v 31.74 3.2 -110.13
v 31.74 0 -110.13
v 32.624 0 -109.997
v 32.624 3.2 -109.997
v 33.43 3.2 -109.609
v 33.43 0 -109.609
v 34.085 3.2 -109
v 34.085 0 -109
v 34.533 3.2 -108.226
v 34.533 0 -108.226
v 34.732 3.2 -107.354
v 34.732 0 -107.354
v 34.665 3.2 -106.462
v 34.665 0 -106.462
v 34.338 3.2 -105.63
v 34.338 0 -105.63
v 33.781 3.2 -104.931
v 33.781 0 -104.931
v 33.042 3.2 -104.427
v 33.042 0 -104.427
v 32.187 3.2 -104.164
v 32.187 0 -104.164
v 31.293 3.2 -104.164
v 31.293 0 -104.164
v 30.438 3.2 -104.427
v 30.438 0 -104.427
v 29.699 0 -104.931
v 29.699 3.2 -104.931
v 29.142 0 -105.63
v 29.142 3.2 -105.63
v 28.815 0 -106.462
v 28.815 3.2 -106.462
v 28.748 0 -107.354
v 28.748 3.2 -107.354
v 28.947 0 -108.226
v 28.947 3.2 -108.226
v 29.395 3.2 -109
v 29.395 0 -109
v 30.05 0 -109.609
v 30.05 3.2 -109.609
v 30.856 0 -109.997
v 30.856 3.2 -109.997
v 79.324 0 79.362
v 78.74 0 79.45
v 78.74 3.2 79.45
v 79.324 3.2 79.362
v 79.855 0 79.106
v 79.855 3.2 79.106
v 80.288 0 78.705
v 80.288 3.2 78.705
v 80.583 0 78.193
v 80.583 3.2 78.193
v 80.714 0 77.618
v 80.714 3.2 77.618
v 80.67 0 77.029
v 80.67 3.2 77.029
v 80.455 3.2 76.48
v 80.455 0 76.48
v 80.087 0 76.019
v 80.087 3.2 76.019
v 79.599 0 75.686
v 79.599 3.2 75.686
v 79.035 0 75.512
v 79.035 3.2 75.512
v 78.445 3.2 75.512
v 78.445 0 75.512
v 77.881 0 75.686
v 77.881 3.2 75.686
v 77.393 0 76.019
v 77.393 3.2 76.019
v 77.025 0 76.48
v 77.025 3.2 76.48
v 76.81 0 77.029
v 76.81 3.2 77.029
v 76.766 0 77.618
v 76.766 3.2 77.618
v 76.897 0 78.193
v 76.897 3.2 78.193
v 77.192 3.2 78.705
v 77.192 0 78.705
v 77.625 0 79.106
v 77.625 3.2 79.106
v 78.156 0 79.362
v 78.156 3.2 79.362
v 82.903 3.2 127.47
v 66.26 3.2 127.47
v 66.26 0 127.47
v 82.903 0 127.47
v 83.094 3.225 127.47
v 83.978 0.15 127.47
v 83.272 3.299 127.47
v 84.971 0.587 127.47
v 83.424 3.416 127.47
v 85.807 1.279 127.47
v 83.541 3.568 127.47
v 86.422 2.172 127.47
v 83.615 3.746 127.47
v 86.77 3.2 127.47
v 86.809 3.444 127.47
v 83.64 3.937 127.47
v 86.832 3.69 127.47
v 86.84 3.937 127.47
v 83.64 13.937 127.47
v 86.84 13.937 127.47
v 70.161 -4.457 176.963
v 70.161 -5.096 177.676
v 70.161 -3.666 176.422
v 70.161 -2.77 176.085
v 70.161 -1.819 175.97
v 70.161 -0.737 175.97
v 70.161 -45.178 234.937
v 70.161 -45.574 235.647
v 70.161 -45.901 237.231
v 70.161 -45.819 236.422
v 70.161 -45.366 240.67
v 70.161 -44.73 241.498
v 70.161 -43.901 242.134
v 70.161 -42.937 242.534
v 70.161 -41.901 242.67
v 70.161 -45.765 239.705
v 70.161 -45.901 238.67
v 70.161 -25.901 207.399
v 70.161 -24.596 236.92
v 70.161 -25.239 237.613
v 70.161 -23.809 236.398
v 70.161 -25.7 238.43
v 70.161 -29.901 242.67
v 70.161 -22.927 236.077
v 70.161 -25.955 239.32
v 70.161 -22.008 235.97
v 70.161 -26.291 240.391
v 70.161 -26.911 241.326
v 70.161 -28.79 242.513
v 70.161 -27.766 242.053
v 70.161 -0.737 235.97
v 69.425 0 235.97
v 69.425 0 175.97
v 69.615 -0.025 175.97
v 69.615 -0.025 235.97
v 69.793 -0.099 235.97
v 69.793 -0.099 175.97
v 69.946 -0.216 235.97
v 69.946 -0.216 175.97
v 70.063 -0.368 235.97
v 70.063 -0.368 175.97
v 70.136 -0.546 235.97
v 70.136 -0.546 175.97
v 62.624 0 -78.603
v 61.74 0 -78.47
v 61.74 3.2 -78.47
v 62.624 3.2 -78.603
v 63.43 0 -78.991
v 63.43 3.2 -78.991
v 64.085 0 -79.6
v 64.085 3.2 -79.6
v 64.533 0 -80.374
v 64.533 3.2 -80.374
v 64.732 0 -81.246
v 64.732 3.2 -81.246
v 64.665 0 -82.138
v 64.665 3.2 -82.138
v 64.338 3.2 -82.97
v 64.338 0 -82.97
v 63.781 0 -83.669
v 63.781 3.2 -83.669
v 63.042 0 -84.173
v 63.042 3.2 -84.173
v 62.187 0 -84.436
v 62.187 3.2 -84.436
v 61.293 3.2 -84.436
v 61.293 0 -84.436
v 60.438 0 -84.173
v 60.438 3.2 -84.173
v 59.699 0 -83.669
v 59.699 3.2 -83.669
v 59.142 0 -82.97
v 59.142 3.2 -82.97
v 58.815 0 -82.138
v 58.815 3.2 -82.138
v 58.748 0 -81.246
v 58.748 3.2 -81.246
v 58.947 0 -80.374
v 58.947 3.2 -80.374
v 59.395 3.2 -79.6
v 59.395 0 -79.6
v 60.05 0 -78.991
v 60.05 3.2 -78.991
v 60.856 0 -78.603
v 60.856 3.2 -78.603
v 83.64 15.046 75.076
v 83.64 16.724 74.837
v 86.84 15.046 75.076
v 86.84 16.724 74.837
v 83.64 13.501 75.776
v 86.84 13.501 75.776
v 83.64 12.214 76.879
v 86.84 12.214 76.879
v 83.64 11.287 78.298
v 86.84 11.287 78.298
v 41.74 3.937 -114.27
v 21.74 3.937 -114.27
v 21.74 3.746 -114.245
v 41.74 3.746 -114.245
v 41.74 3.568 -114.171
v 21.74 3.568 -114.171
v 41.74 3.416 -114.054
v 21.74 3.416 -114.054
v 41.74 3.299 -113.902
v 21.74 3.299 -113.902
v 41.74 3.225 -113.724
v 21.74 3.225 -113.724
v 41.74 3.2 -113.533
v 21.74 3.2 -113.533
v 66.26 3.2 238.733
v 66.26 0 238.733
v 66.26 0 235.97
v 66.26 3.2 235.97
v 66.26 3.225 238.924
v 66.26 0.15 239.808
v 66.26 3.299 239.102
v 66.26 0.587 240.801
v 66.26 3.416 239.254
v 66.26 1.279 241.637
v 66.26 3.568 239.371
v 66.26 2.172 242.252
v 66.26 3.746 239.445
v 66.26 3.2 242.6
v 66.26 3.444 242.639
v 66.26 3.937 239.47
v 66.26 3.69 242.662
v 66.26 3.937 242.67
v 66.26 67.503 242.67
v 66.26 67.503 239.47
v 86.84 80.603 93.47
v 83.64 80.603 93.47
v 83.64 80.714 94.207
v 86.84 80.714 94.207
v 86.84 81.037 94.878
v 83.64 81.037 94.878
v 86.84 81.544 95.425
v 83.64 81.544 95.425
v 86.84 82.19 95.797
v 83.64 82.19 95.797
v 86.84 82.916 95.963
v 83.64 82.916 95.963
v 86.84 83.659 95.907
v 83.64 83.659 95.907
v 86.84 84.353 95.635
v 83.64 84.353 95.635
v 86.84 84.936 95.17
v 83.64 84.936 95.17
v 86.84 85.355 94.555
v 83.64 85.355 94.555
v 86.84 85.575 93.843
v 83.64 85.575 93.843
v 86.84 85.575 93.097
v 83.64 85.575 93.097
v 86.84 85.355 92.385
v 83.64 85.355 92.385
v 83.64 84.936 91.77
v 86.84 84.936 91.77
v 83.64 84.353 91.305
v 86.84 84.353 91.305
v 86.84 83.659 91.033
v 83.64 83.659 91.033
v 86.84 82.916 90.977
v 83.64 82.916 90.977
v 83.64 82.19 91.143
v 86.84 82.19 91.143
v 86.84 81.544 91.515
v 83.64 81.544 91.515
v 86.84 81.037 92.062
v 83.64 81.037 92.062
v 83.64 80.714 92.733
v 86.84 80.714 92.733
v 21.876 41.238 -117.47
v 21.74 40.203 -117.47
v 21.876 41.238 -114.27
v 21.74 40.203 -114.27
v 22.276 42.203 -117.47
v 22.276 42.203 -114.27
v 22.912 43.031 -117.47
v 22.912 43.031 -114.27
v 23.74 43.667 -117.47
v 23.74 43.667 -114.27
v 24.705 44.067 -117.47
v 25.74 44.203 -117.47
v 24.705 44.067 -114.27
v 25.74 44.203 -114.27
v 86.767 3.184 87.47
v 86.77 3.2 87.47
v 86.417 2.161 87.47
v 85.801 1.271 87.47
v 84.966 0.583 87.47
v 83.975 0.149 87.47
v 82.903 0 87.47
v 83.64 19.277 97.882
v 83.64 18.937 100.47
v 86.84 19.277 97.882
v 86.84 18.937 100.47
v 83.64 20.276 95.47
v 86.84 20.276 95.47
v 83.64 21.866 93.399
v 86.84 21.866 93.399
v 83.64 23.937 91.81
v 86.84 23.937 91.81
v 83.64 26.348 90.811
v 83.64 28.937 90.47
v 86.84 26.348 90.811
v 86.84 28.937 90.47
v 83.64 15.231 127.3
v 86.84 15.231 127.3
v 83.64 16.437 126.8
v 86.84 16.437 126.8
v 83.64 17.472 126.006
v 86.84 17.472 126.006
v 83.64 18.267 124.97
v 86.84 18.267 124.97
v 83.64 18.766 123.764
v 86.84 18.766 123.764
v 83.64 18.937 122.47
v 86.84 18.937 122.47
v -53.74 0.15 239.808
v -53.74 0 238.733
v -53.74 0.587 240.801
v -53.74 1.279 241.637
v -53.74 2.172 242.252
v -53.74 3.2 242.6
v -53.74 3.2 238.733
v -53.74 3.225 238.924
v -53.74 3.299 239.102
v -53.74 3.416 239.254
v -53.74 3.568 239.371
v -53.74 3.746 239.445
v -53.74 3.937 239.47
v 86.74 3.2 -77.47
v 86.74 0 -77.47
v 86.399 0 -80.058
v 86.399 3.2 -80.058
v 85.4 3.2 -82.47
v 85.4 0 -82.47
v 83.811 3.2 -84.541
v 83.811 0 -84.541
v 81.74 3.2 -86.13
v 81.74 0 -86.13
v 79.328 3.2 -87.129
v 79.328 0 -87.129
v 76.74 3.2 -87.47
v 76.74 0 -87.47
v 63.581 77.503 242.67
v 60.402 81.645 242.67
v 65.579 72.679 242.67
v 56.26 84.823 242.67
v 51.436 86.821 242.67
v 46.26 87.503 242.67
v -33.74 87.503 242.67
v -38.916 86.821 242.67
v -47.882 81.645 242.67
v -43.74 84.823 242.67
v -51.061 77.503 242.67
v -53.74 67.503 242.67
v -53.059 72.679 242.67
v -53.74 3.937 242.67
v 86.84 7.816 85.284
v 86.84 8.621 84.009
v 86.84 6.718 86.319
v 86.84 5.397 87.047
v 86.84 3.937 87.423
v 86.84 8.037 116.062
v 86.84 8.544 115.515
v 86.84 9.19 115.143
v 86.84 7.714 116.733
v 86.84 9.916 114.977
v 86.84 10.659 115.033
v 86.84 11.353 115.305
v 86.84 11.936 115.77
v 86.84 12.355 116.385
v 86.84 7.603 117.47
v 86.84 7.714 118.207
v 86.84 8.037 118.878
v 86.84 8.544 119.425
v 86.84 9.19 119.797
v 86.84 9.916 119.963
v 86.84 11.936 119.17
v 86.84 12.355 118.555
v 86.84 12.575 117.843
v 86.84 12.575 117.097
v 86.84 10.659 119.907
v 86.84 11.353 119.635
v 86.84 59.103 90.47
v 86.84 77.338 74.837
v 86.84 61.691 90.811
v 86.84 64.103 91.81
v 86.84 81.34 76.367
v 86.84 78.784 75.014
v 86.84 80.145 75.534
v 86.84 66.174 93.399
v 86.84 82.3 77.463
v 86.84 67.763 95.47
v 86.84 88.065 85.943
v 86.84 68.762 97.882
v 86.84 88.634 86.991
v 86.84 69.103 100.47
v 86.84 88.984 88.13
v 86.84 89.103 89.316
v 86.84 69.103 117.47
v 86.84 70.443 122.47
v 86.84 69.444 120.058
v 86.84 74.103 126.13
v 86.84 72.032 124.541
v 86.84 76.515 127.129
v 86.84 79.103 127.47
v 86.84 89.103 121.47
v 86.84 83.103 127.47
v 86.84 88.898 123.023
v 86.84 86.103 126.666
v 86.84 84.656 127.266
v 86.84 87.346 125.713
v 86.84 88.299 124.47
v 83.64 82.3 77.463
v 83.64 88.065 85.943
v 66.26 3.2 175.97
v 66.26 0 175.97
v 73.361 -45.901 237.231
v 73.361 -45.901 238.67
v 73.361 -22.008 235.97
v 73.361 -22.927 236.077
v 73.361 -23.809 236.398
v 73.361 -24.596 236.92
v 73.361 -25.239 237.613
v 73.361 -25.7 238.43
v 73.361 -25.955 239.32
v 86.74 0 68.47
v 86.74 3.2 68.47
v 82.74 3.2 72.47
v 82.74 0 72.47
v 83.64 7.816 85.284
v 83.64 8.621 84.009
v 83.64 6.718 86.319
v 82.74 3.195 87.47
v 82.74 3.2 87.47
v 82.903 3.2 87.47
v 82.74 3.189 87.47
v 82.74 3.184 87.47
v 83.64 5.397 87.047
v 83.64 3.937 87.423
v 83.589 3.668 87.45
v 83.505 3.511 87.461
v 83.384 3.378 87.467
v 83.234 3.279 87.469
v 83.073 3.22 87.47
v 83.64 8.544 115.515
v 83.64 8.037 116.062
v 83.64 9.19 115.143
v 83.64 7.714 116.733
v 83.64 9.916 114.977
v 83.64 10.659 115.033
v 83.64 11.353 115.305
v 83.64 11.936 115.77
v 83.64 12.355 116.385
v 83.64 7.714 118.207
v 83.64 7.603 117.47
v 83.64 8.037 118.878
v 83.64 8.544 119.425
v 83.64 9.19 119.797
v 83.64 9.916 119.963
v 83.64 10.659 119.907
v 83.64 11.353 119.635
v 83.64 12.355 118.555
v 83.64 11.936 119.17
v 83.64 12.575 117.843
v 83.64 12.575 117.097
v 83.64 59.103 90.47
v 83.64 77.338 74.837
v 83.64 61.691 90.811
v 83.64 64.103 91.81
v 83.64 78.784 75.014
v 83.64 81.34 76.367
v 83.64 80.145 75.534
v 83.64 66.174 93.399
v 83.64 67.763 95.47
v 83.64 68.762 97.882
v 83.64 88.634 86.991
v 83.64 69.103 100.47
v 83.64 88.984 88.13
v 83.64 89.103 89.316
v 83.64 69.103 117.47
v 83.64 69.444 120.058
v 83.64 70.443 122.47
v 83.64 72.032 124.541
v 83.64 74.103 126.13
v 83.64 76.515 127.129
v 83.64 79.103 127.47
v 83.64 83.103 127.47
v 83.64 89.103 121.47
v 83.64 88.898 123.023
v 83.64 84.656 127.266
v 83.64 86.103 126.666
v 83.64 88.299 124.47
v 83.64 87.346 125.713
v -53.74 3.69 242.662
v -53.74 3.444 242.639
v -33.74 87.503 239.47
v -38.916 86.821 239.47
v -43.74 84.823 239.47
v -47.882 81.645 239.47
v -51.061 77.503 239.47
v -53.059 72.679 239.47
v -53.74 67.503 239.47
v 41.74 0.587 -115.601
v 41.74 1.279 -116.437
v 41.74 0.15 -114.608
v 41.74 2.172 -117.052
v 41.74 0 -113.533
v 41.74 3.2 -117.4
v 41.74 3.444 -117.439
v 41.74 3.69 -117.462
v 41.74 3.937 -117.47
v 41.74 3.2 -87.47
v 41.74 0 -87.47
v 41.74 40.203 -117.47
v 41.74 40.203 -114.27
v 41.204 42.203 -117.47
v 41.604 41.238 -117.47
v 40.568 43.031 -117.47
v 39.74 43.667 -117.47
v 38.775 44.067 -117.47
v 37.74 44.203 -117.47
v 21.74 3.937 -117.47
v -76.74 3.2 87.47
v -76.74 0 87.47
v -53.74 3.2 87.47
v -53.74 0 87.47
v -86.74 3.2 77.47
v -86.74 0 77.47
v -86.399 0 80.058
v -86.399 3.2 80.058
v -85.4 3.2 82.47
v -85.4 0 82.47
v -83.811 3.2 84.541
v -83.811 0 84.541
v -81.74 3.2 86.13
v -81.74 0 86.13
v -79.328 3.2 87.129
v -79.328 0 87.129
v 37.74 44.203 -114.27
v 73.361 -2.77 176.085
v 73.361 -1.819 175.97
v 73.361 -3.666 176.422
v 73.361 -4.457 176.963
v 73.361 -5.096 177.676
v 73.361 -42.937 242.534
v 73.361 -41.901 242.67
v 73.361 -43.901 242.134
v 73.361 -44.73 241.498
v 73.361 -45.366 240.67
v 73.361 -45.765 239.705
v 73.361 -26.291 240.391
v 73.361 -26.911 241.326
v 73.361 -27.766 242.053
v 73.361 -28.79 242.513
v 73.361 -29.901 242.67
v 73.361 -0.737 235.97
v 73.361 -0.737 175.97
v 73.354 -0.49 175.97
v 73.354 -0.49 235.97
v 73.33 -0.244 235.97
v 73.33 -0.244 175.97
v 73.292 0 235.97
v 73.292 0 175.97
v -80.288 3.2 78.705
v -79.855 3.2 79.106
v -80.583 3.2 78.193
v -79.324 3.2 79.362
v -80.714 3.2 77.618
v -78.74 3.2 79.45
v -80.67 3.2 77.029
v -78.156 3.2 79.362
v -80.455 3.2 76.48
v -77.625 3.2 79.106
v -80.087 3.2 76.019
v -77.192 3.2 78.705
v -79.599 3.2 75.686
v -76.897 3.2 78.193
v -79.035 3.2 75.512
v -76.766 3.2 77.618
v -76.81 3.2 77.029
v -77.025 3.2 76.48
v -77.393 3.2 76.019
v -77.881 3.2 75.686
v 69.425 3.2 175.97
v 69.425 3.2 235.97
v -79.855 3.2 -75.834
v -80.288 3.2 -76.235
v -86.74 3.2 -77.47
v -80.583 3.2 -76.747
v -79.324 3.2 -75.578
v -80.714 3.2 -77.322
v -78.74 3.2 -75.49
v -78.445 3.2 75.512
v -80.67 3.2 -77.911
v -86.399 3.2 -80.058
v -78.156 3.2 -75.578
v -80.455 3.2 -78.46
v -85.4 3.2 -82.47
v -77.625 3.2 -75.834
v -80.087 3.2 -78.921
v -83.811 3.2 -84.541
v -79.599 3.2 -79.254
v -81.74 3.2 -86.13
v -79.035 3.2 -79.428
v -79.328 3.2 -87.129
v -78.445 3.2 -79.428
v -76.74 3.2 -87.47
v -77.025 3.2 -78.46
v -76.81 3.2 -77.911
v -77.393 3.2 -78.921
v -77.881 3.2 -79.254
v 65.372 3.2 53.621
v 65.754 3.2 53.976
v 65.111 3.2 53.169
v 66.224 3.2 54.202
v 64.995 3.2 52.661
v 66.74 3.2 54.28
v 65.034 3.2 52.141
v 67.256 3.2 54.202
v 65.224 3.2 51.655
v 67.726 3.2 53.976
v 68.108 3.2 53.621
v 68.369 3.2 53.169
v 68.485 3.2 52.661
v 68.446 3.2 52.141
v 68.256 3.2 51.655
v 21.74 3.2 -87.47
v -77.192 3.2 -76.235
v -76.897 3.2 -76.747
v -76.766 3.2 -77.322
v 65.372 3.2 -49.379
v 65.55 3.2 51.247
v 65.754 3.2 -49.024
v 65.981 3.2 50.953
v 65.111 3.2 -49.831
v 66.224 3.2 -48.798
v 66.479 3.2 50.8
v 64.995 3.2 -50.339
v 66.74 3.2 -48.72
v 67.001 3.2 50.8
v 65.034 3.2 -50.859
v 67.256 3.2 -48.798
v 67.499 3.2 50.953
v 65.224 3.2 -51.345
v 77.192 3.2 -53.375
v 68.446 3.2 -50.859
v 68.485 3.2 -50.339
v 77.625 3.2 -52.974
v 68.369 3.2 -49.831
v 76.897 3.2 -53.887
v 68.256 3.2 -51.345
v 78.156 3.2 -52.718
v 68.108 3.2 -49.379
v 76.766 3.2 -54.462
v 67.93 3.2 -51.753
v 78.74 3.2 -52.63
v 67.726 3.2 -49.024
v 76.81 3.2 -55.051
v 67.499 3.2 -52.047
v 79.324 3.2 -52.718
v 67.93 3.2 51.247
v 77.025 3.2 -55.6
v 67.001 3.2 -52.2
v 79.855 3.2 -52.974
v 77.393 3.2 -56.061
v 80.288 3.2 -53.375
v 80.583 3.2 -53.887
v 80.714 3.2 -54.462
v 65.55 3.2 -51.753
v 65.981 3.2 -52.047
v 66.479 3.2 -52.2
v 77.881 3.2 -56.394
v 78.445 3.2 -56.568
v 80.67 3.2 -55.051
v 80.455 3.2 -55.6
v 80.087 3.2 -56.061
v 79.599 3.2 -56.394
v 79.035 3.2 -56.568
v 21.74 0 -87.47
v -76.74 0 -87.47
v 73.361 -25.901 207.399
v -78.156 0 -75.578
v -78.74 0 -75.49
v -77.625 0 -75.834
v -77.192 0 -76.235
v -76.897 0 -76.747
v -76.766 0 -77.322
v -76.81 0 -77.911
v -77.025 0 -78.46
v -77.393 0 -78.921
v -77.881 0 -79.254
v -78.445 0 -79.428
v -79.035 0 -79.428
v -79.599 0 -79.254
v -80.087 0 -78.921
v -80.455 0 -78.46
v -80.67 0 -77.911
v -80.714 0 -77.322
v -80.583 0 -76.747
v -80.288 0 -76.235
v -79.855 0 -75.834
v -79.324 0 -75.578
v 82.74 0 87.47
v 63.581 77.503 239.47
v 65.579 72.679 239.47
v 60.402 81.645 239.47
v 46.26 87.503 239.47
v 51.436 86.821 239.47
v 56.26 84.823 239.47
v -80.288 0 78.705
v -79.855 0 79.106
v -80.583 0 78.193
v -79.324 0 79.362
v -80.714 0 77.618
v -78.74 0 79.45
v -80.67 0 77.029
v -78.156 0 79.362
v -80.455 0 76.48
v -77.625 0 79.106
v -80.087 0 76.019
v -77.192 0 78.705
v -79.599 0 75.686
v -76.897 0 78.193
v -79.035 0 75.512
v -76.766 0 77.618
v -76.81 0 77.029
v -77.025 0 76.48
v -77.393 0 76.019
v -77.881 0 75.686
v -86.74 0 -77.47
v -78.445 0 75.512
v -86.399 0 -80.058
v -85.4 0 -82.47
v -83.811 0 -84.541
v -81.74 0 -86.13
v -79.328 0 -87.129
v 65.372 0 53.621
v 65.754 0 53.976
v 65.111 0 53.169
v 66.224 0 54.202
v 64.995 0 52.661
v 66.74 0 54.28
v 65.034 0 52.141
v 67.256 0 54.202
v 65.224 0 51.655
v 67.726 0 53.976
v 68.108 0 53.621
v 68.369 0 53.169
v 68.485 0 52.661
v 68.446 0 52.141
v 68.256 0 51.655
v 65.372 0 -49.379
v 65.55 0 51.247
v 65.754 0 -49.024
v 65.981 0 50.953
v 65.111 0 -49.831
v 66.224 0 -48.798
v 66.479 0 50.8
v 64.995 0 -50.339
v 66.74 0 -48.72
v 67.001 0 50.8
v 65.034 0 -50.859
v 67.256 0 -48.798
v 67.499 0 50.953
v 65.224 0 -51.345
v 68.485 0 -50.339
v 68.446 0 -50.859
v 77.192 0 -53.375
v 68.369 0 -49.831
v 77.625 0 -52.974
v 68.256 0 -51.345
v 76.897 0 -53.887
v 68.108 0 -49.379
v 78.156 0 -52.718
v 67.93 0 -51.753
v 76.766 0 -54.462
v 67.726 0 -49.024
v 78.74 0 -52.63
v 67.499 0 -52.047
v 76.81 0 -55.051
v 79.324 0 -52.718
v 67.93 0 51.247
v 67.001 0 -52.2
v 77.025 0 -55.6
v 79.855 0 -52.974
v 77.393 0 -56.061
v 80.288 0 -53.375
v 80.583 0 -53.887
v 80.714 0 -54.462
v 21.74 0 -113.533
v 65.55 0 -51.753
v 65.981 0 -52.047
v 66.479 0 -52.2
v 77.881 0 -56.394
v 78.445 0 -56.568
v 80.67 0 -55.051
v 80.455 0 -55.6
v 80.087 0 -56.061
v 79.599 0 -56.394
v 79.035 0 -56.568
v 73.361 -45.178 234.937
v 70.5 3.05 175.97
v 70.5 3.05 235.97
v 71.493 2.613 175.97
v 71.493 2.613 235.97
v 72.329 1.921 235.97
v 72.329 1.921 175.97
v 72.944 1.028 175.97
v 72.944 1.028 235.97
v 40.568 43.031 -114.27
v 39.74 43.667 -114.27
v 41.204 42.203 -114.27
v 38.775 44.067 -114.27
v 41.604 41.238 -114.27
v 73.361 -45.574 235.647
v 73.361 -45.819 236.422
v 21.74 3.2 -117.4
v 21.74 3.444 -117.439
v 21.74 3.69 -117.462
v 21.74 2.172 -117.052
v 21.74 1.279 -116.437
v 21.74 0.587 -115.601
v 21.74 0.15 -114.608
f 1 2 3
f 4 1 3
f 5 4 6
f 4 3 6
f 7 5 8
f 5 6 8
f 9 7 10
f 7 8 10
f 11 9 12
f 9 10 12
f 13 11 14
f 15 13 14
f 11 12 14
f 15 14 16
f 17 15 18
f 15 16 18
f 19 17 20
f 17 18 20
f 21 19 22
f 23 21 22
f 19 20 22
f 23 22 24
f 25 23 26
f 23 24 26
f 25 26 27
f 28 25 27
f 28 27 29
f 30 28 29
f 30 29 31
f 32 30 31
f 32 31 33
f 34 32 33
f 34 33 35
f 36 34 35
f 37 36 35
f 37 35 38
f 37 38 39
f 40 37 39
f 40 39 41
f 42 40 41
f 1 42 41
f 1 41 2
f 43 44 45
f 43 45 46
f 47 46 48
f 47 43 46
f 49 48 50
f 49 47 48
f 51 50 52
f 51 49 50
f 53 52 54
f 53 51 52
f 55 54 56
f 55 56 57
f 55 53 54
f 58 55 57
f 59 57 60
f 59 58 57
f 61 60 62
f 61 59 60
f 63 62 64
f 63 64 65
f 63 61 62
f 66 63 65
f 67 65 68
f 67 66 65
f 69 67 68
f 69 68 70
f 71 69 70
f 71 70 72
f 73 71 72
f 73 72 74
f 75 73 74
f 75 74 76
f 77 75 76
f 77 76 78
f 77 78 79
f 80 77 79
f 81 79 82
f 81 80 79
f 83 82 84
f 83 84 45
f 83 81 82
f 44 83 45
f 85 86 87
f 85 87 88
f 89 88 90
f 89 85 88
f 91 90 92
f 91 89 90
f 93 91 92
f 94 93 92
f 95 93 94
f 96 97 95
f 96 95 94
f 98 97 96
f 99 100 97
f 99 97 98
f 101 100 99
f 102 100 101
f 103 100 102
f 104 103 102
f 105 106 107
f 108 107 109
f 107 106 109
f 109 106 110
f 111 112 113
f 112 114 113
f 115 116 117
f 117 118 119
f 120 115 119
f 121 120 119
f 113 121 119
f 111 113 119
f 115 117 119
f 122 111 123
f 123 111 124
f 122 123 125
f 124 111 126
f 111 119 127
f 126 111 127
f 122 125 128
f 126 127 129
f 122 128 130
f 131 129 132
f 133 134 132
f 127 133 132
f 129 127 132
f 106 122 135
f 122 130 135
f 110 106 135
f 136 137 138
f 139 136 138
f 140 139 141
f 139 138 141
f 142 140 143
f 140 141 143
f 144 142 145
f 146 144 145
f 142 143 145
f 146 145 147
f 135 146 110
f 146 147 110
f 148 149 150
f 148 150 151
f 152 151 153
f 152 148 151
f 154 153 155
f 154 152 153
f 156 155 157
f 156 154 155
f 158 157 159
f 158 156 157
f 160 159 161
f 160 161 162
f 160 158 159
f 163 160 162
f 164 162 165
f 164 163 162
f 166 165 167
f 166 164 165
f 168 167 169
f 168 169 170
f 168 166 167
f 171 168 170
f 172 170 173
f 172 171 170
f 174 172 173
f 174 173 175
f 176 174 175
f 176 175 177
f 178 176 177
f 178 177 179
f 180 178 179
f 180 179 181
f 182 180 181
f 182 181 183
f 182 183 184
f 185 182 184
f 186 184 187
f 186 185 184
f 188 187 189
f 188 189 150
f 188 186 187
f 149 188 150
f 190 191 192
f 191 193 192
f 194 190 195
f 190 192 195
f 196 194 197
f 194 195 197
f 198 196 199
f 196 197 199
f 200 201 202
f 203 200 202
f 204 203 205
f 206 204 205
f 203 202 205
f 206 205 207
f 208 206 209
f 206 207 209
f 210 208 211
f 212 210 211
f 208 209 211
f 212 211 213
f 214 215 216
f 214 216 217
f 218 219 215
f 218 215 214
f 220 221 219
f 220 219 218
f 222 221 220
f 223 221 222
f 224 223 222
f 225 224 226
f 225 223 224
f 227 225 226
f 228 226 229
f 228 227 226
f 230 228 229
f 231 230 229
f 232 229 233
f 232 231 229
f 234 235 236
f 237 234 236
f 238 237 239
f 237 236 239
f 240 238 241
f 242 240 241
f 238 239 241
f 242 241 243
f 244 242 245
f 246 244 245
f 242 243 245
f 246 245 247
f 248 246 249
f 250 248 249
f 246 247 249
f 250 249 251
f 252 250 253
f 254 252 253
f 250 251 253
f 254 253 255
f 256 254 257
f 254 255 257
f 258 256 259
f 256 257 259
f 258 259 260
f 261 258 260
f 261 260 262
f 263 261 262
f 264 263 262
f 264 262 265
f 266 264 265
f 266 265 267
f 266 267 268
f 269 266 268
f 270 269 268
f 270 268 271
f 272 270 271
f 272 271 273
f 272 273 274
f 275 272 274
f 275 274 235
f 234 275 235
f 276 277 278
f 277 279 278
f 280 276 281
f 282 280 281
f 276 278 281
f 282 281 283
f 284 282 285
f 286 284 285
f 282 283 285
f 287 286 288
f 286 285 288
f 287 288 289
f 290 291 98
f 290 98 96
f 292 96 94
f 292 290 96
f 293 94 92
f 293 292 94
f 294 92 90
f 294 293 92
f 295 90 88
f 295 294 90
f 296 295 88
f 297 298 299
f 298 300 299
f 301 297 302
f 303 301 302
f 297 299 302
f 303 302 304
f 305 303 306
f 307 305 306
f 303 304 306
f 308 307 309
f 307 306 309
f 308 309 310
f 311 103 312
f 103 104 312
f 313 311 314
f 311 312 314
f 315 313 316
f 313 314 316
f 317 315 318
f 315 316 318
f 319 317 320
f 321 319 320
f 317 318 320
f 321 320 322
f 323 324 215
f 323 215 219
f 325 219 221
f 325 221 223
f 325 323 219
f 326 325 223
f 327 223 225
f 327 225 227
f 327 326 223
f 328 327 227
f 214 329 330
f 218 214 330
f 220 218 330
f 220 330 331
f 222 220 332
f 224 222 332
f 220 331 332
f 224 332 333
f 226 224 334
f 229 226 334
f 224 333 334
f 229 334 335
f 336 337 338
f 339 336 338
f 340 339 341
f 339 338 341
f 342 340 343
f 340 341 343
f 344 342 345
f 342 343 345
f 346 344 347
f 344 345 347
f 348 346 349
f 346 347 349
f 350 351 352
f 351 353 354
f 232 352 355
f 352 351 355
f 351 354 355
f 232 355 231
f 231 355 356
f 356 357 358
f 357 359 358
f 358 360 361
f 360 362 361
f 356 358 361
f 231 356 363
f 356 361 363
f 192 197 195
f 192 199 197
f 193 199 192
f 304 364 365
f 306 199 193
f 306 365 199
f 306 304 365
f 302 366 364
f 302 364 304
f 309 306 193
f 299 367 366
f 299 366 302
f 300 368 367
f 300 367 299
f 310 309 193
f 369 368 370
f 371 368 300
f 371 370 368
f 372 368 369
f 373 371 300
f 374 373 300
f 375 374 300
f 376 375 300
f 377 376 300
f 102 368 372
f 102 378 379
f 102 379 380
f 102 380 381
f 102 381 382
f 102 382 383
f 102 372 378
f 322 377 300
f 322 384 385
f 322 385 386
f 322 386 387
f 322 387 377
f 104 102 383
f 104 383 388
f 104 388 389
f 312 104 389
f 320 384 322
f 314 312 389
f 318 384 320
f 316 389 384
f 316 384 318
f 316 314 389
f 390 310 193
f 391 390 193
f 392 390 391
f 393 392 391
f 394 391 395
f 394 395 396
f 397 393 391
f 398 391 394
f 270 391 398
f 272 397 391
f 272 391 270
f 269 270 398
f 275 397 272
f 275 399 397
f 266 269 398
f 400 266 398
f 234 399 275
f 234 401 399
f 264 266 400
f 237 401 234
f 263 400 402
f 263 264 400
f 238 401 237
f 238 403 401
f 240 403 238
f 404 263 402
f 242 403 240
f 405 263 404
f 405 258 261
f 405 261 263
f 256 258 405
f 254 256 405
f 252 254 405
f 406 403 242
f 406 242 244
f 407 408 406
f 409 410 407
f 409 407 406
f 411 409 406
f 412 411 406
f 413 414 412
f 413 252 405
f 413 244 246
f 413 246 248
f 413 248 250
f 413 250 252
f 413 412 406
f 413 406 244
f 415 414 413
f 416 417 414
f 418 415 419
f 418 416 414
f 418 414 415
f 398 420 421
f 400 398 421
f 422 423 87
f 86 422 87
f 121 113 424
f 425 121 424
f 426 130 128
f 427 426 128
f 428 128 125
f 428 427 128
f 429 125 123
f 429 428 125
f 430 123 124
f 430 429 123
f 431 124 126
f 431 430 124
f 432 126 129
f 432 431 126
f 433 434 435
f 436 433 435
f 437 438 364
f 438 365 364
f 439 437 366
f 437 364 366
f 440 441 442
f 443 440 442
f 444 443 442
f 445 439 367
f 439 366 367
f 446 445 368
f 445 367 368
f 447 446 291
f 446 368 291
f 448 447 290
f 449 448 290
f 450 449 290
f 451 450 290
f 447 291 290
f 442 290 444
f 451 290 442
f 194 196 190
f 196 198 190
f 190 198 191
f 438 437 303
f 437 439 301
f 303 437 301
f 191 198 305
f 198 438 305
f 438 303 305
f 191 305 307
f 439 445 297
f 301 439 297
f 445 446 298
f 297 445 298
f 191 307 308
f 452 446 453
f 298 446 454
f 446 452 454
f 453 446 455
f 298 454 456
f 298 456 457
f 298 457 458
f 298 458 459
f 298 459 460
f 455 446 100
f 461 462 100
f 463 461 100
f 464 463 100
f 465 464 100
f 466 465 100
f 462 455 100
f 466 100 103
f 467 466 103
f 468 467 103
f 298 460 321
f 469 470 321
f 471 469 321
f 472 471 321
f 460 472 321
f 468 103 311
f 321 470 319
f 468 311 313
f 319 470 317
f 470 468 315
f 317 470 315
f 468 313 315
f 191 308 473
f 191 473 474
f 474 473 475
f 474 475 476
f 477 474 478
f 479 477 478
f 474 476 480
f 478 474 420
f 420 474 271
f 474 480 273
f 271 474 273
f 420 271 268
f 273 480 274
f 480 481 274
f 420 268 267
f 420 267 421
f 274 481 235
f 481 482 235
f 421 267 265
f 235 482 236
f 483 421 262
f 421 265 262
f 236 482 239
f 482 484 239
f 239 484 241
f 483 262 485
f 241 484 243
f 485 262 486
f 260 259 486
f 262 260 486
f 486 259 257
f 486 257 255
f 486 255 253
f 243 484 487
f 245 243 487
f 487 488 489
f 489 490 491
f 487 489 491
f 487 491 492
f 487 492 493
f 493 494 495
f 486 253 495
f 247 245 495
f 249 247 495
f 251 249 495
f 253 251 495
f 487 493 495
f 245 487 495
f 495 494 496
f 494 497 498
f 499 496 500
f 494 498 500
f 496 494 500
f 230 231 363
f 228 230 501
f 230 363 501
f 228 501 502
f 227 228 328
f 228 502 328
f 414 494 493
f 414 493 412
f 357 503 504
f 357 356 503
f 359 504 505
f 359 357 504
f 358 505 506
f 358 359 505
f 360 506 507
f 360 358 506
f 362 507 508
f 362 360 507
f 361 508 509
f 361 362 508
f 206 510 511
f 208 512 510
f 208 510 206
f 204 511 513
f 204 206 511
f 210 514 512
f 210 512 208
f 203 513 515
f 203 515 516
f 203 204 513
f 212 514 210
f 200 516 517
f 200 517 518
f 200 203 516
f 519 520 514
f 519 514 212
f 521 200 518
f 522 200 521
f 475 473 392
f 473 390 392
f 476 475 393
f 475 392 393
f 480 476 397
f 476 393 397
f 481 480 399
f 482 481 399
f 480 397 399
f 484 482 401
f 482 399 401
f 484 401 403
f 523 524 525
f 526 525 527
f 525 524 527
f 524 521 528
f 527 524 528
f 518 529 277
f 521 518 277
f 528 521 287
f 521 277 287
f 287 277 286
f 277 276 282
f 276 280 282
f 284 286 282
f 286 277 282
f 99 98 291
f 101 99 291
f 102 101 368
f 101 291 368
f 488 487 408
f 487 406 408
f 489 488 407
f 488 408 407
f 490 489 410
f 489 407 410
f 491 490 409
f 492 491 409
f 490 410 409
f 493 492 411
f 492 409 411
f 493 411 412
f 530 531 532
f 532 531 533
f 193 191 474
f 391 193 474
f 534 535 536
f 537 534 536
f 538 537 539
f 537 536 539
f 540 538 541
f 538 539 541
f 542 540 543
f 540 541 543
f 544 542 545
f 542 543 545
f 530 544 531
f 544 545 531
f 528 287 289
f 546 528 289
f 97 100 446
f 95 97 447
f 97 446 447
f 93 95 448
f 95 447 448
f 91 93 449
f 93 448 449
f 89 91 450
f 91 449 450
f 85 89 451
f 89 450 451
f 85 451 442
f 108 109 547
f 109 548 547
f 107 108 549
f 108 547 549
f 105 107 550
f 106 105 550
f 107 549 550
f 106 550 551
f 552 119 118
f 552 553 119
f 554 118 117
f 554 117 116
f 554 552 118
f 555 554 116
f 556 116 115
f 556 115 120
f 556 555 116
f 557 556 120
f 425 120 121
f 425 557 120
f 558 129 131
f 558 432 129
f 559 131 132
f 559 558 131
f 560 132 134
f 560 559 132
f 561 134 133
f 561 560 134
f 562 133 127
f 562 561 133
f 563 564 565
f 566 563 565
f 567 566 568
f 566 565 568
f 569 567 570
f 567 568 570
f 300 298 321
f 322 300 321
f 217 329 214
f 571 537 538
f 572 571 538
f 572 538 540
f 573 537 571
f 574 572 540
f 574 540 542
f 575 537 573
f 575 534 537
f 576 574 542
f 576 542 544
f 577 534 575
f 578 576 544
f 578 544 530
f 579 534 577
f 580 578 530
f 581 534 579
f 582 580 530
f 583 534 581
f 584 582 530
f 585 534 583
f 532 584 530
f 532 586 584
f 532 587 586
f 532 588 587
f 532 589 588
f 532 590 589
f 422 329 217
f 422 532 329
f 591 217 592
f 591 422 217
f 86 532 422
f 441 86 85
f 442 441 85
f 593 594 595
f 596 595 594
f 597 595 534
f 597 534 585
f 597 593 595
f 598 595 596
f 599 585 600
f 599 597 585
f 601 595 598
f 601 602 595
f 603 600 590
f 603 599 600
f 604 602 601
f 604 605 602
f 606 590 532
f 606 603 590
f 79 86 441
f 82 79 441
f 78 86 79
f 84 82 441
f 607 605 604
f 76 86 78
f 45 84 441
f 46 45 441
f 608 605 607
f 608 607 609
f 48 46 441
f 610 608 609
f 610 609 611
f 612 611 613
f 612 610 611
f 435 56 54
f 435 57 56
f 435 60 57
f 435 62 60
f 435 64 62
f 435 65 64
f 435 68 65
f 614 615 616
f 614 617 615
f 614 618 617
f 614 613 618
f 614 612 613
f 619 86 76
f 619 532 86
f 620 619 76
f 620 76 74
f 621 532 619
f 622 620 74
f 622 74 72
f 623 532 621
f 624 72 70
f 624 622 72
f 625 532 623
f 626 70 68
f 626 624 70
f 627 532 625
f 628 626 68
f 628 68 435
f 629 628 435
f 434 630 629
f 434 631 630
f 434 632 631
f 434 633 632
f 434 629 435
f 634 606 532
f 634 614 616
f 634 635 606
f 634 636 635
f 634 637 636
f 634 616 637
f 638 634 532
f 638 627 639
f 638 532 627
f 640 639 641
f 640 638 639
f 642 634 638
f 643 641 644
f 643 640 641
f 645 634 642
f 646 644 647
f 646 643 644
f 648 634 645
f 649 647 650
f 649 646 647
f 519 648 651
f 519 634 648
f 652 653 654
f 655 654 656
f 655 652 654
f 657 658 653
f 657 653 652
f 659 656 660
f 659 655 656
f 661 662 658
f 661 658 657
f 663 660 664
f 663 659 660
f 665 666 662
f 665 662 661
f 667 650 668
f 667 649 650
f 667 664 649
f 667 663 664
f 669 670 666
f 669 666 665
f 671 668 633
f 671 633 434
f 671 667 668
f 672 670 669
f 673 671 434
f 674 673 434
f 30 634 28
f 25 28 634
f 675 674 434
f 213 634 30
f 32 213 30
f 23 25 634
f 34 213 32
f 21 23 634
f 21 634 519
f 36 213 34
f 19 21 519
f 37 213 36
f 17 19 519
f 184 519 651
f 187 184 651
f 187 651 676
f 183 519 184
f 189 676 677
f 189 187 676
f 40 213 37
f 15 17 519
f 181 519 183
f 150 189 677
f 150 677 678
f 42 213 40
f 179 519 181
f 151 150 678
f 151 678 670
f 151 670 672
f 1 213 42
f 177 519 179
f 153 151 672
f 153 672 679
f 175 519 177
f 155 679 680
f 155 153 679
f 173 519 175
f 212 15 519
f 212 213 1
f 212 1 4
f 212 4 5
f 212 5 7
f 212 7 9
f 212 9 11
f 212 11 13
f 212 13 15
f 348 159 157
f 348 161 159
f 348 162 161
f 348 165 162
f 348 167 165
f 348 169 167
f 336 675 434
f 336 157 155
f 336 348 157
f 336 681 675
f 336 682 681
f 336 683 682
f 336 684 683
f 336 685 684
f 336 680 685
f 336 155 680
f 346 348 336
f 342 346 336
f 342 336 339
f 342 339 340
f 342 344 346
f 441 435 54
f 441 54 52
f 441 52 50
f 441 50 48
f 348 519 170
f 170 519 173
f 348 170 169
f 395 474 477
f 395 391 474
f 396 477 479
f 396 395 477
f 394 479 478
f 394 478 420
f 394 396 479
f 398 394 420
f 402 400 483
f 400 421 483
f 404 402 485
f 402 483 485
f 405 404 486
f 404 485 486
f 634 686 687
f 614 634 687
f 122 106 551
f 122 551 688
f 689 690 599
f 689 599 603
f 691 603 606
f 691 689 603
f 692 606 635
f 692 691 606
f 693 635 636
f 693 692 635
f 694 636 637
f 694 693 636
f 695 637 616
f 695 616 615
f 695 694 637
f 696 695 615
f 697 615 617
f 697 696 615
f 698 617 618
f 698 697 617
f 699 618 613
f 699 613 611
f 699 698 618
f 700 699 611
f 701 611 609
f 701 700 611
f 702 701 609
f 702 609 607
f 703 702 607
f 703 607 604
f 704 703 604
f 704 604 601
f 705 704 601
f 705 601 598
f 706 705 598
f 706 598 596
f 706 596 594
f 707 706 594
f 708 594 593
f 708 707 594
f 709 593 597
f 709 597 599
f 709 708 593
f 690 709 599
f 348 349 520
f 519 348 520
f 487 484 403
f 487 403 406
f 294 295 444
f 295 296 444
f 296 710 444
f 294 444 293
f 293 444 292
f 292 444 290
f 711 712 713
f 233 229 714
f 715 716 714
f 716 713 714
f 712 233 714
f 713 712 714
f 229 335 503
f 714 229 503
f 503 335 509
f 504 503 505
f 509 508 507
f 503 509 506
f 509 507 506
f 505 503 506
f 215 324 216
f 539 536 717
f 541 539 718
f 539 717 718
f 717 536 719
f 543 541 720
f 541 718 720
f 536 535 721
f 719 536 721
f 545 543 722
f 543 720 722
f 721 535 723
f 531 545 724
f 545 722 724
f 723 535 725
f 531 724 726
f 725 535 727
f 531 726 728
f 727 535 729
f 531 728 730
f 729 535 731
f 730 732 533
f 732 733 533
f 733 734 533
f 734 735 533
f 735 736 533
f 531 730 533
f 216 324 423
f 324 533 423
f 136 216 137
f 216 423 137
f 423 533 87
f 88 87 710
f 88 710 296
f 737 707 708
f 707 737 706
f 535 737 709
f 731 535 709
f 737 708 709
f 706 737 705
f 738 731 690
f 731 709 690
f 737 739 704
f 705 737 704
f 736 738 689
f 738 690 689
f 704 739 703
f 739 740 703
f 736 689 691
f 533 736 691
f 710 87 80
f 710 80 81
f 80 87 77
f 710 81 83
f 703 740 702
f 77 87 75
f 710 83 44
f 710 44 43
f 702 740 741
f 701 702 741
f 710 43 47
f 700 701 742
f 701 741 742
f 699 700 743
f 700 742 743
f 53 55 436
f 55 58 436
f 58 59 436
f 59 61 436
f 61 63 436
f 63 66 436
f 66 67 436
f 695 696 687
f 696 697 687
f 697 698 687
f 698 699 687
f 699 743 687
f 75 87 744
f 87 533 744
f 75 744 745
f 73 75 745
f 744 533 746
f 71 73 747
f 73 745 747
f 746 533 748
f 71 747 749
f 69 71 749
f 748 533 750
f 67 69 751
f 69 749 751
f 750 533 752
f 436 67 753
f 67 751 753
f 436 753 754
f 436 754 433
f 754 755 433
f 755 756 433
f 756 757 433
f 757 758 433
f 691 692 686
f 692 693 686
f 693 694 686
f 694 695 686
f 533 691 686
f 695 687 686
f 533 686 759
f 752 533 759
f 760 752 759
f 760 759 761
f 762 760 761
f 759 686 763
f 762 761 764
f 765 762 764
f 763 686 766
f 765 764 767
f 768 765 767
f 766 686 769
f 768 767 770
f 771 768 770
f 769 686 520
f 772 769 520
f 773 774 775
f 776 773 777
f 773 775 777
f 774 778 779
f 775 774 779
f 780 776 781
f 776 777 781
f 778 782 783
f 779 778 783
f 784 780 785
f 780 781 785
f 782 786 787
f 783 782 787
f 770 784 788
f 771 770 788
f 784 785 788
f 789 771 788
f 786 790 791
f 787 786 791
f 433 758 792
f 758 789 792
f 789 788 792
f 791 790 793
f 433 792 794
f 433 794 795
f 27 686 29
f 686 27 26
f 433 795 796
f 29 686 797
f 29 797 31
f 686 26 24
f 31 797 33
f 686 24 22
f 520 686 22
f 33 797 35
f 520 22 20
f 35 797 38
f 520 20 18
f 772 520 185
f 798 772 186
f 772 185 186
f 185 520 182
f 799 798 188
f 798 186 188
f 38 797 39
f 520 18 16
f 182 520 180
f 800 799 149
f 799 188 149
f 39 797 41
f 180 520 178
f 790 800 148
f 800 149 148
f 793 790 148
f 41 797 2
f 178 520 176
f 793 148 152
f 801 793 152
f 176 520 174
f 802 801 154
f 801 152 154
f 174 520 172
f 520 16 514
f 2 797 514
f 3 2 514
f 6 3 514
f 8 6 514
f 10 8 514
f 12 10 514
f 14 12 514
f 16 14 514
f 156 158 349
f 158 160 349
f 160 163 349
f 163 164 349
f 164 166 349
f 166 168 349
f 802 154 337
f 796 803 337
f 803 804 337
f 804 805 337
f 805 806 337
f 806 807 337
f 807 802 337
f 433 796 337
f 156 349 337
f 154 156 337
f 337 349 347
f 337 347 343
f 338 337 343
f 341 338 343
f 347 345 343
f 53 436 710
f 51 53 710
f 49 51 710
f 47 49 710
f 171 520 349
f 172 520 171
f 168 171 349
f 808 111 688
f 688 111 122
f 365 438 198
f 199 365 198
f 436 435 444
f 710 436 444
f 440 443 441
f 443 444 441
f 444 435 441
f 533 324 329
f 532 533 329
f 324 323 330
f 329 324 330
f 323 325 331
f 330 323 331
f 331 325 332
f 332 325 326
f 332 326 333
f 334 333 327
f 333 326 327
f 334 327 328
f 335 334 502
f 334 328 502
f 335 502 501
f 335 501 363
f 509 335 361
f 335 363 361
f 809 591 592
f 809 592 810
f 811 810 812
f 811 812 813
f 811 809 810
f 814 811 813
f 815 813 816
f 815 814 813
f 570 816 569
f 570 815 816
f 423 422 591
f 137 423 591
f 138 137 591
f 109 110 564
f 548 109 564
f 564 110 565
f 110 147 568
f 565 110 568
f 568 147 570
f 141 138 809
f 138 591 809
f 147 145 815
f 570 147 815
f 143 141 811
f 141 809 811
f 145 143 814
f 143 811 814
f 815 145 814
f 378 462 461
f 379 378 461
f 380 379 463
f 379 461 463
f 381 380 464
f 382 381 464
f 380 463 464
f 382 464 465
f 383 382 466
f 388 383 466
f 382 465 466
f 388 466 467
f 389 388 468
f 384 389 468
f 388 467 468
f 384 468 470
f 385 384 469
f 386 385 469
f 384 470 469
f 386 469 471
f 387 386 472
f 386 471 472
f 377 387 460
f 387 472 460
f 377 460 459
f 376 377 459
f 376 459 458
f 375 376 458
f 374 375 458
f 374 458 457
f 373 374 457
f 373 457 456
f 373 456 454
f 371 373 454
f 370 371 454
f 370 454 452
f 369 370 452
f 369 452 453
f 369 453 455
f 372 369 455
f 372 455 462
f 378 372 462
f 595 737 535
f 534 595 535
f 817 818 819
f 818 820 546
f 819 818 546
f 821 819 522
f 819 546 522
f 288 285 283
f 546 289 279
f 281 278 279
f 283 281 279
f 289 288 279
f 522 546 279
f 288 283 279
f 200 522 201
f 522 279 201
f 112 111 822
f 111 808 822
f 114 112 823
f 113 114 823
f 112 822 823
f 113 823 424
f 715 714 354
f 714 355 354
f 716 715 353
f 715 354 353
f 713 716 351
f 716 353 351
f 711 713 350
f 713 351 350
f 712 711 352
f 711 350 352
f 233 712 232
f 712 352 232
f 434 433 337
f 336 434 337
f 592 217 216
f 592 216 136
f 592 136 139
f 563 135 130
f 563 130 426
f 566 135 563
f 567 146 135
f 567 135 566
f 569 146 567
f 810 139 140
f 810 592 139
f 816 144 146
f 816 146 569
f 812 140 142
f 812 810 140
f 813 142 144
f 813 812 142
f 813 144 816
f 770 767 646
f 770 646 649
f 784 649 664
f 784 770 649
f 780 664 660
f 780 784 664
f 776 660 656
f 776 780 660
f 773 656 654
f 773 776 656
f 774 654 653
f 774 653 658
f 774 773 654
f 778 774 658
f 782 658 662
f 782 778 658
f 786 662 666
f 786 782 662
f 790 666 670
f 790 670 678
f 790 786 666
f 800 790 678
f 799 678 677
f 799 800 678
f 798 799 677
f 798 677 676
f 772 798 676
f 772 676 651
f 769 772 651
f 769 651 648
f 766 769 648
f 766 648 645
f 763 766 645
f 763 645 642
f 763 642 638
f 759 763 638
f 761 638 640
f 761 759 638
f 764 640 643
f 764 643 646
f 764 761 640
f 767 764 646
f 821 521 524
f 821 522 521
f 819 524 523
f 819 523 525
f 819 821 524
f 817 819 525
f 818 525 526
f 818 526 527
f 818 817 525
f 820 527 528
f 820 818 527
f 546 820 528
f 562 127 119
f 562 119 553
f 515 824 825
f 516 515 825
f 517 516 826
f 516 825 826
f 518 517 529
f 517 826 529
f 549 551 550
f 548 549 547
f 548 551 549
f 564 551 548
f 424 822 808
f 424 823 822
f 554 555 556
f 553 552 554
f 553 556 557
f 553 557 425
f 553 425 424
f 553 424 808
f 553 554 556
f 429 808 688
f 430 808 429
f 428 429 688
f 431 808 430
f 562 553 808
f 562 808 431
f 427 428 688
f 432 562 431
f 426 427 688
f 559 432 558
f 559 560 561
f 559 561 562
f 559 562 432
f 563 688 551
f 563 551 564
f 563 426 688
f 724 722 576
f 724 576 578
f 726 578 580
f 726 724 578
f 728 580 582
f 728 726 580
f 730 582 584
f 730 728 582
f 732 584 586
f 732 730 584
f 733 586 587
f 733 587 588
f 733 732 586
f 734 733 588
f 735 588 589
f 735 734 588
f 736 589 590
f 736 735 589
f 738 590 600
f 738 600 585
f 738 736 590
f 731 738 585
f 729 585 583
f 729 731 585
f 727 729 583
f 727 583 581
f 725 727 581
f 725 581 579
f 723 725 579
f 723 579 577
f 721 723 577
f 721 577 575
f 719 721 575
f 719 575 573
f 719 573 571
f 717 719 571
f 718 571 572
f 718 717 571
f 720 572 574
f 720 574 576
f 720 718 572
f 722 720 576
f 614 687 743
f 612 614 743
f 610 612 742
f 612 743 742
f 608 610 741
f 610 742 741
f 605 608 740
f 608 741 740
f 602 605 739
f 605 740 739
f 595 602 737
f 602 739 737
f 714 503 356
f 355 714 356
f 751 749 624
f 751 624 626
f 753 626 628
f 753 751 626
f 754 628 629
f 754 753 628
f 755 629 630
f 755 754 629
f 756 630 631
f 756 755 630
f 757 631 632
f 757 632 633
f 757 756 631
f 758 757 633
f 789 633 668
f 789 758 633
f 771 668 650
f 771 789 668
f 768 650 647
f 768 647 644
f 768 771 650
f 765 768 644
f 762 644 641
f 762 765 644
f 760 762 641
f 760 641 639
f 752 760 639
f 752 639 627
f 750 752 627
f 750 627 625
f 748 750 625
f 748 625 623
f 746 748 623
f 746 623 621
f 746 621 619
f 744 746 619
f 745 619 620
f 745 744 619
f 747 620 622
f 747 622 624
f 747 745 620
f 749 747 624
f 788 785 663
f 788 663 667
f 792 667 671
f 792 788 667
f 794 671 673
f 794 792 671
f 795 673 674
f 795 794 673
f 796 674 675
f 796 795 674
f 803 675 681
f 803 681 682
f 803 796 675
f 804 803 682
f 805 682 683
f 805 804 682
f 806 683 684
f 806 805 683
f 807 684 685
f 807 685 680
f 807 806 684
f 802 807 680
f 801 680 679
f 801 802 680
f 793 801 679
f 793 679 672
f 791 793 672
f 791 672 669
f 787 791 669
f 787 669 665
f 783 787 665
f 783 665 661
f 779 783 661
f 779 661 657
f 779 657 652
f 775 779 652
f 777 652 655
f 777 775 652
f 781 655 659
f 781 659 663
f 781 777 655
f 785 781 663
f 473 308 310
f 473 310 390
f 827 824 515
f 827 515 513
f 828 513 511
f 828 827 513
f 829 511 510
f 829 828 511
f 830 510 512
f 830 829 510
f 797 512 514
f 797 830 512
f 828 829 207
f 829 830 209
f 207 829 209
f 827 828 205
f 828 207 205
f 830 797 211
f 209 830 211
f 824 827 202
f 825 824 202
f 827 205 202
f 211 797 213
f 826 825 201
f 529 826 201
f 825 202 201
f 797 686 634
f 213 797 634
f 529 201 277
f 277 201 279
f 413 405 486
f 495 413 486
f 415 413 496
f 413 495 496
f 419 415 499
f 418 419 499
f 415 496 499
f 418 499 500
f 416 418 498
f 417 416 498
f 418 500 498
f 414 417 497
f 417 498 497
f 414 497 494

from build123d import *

# Parameters (mm, degrees)
SKETCH1_R                  = 1.98
SKETCH1_R_2                = 3
SKETCH1_R_3                = 1.75
BASE_FLANGE1_DEPTH         = 3.2
CUT_EXTRUDE1_DEPTH         = 369.458014569
SKETCHED_START             = 74.836838233
SKETCHED_BEND1_DEPTH       = 52.633161767
SKETCHED_START_2           = 87.47
SKETCHED_BEND1_2_DEPTH     = 40
SKETCHED_START_3           = 83.64
SKETCHED_BEND1_3_DEPTH     = 3.2
SKETCH9_R                  = 2.5
CUT_EXTRUDE2_DEPTH         = 379.450932148
FILLET1_R                  = 6
SKETCH10_W                 = 60
SKETCH10_H                 = 50.166277303
CUT_EXTRUDE3_DEPTH         = 379.450932148
FILLET2_R                  = 10
SKETCHED_START_4           = 21.74
SKETCHED_BEND2_DEPTH       = 20
SKETCHED_BEND2_2_DEPTH     = 20
FILLET3_R                  = 5
SKETCH13_R                 = 3
CUT_EXTRUDE4_DEPTH         = 359.024009312
SKETCHED_START_5           = -53.74
SKETCHED_BEND3_DEPTH       = 120
SKETCHED_BEND3_2_DEPTH     = 120
FILLET4_R                  = 20
SKETCHED_START_6           = 175.97
SKETCHED_BEND5_DEPTH       = 66.7
SKETCHED_START_7           = 208.025657316
SKETCHED_BEND5_2_DEPTH     = 27.944342684
SKETCHED_START_8           = 235.97
SKETCHED_BEND5_3_OUTLINE_W = 3.2
SKETCHED_BEND5_3_OUTLINE_H = 20
SKETCHED_BEND5_3_DEPTH     = 6.7
SKETCHED_BEND5_4_DEPTH     = 32.055657316
SKETCHED_START_9           = 70.161438651
SKETCHED_BEND5_5_DEPTH     = 3.2
SKETCHED_BEND5_6_DEPTH     = 3.2
FILLET5_R                  = 4
FILLET6_R                  = 4
FILLET7_R                  = 4


with BuildPart() as part:
    # Base-Flange1: sheet metal written as solids
    # Sketch1 → Base-Flange1 (new body)
    with BuildSketch(Plane(origin=(0, 0, 0), x_dir=(1, 0, 0), z_dir=(0, 1, 0))):
        with BuildLine():
            Line((-86.74, 77.47), (-86.74, -77.47))
            ThreePointArc((-86.74, -77.47), (-83.811067812, -84.541067812), (-76.74, -87.47))
            Line((-76.74, -87.47), (-53.74, -87.47))
            Line((-53.74, -87.47), (-53.74, -325.97))
            Line((-53.74, -325.97), (66.26, -325.97))
            Line((66.26, -325.97), (66.26, -235.97))
            Line((66.26, -235.97), (98.26, -235.97))
            Line((98.26, -235.97), (98.26, -242.67))
            Line((98.26, -242.67), (118.26, -242.67))
            Line((118.26, -242.67), (118.26, -235.97))
            Line((118.26, -235.97), (76.26, -175.97))
            Line((76.26, -175.97), (66.26, -175.97))
            Line((66.26, -175.97), (66.26, -127.47))
            Line((66.26, -127.47), (86.74, -127.47))
            Line((86.74, -127.47), (171.74, -127.47))
            Line((171.74, -127.47), (171.74, -87.47))
            Line((171.74, -87.47), (163.151263871, -74.836838233))
            Line((163.151263871, -74.836838233), (95.540712582, -74.836838233))
            Line((95.540712582, -74.836838233), (89.641340328, -87.47))
            Line((89.641340328, -87.47), (86.74, -87.47))
            Line((86.74, -87.47), (86.74, 77.47))
            ThreePointArc((86.74, 77.47), (83.811067812, 84.541067812), (76.74, 87.47))
            Line((76.74, 87.47), (41.74, 87.47))
            Line((41.74, 87.47), (41.74, 157.47))
            Line((41.74, 157.47), (21.74, 157.47))
            Line((21.74, 157.47), (21.74, 87.47))
            Line((21.74, 87.47), (-76.74, 87.47))
            ThreePointArc((-76.74, 87.47), (-83.811067812, 84.541067812), (-86.74, 77.47))
        make_face()
        with Locations(Location((-78.74, 77.47, 0), (0, 0, 270))):
            Circle(SKETCH1_R, mode=Mode.SUBTRACT)
        with Locations(Location((-78.74, -77.47, 0), (0, 0, 270))):
            Circle(SKETCH1_R, mode=Mode.SUBTRACT)
        with Locations(Location((78.74, -77.47, 0), (0, 0, 270))):
            Circle(SKETCH1_R, mode=Mode.SUBTRACT)
        with Locations(Location((78.74, 54.61, 0), (0, 0, 270))):
            Circle(SKETCH1_R, mode=Mode.SUBTRACT)
        with Locations(Location((61.74, 81.47, 0), (0, 0, 270))):
            Circle(SKETCH1_R_2, mode=Mode.SUBTRACT)
        with Locations(Location((66.74, 50.47, 0), (0, 0, 270))):
            Circle(SKETCH1_R_3, mode=Mode.SUBTRACT)
        with Locations(Location((66.74, -52.53, 0), (0, 0, 270))):
            Circle(SKETCH1_R_3, mode=Mode.SUBTRACT)
    extrude(amount=BASE_FLANGE1_DEPTH)

    # Sketch6 → Cut-Extrude1 (cut, through all)
    with BuildSketch(Plane(origin=(0, 3.2, 0), x_dir=(1, 0, 0), z_dir=(0, 1, 0))):
        Polygon((86.74, -68.47), (82.74, -72.47), (82.74, -87.47), (86.74, -87.47), align=None)
    extrude(amount=-CUT_EXTRUDE1_DEPTH, mode=Mode.SUBTRACT)

    # Sketched Bend1: read off the stored shape, not the designer's step
    # Sketched Bend1 outline → Sketched Bend1 (cut)
    with BuildSketch(Plane.XY.offset(SKETCHED_START)):
        with BuildLine():
            Line((171.74, 3.2), (86.770471243, 3.2))
            ThreePointArc((86.770471243, 3.2), (85.413093209, 0.903736739), (82.9034, 0))
            Line((82.9034, 0), (171.74, 0))
            Line((171.74, 0), (171.74, 3.2))
        make_face()
    extrude(amount=SKETCHED_BEND1_DEPTH, mode=Mode.SUBTRACT)

    # Sketched Bend1 2 outline → Sketched Bend1 2 (add)
    with BuildSketch(Plane.XY.offset(SKETCHED_START_2)):
        with BuildLine():
            Line((86.84, 89.102877303), (83.64, 89.102877303))
            Line((83.64, 89.102877303), (83.64, 3.9366))
            ThreePointArc((83.64, 3.9366), (83.424254855, 3.415745145), (82.9034, 3.2))
            Line((82.9034, 3.2), (86.770471243, 3.2))
            ThreePointArc((86.770471243, 3.2), (86.822579265, 3.566662908), (86.84, 3.9366))
            Line((86.84, 3.9366), (86.84, 89.102877303))
        make_face()
    extrude(amount=SKETCHED_BEND1_2_DEPTH)

    # Sketched Bend1 3 outline → Sketched Bend1 3 (add)
    with BuildSketch(Plane.YZ.offset(SKETCHED_START_3)):
        Polygon((12.903589884, 74.836838233), (80.514141174, 74.836838233), (89.102877303, 87.47), (7.004217631, 87.47), align=None)
    extrude(amount=SKETCHED_BEND1_3_DEPTH)

    # Sketch9 → Cut-Extrude2 (cut, through all)
    with BuildSketch(Plane.ZY.offset(-83.64)):
        with Locations(Location((93.47, 83.102877303, 0), (0, 0, 270))):
            Circle(SKETCH9_R)
        with Locations(Location((117.47, 10.102877303, 0), (0, 0, 270))):
            Circle(SKETCH9_R)
    extrude(amount=-CUT_EXTRUDE2_DEPTH, mode=Mode.SUBTRACT)

    # Fillet1
    fillet1_edges = [part.edges().sort_by_distance(p)[0] for p in [
        (85.24, 7.004217631, 87.47),
        (85.24, 12.903589884, 74.836838233),
        (85.24, 80.514141174, 74.836838233),
        (85.24, 89.102877303, 87.47),
        (85.24, 89.102877303, 127.47),
    ]]
    fillet(fillet1_edges, radius=FILLET1_R)

    # Sketch10 → Cut-Extrude3 (cut, through all)
    with BuildSketch(Plane.ZY.offset(-83.64)):
        with Locations((120.47, 44.019738651)):
            Rectangle(SKETCH10_W, SKETCH10_H)
    extrude(amount=-CUT_EXTRUDE3_DEPTH, mode=Mode.SUBTRACT)

    # Fillet2
    fillet2_edges = [part.edges().sort_by_distance(p)[0] for p in [
        (85.24, 18.9366, 90.47),
        (85.24, 69.102877303, 127.47),
        (85.24, 69.102877303, 90.47),
    ]]
    fillet(fillet2_edges, radius=FILLET2_R)

    # Sketched Bend2: read off the stored shape, not the designer's step
    # Sketched Bend2 outline → Sketched Bend2 (cut)
    with BuildSketch(Plane.YZ.offset(SKETCHED_START_4)):
        with BuildLine():
            Line((3.2, -157.47), (3.2, -117.400471243))
            ThreePointArc((3.2, -117.400471243), (0.903736739, -116.043093209), (0, -113.5334))
            Line((0, -113.5334), (0, -157.47))
            Line((0, -157.47), (3.2, -157.47))
        make_face()
    extrude(amount=SKETCHED_BEND2_DEPTH, mode=Mode.SUBTRACT)

    # Sketched Bend2 2 outline → Sketched Bend2 2 (add)
    with BuildSketch(Plane.YZ.offset(SKETCHED_START_4)):
        with BuildLine():
            Line((44.202877303, -114.27), (3.9366, -114.27))
            ThreePointArc((3.9366, -114.27), (3.415745145, -114.054254855), (3.2, -113.5334))
            Line((3.2, -113.5334), (3.2, -117.400471243))
            ThreePointArc((3.2, -117.400471243), (3.566662908, -117.452579265), (3.9366, -117.47))
            Line((3.9366, -117.47), (44.202877303, -117.47))
            Line((44.202877303, -117.47), (44.202877303, -114.27))
        make_face()
    extrude(amount=SKETCHED_BEND2_2_DEPTH)

    # Fillet3
    fillet3_edges = [part.edges().sort_by_distance(p)[0] for p in [
        (85.24, 18.9366, 127.47),
    ]]
    fillet(fillet3_edges, radius=FILLET3_R)

    # Sketch13 → Cut-Extrude4 (cut, through all)
    with BuildSketch(Plane.XZ):
        with Locations(Location((31.74, -107.13, 0), (0, 0, 270))):
            Circle(SKETCH13_R)
    extrude(amount=-CUT_EXTRUDE4_DEPTH, mode=Mode.SUBTRACT)

    # Sketched Bend3: read off the stored shape, not the designer's step
    # Sketched Bend3 outline → Sketched Bend3 (cut)
    with BuildSketch(Plane.YZ.offset(SKETCHED_START_5)):
        with BuildLine():
            ThreePointArc((0, 238.7334), (0.903736739, 241.243093209), (3.2, 242.600471243))
            Line((3.2, 242.600471243), (3.2, 325.97))
            Line((3.2, 325.97), (0, 325.97))
            Line((0, 325.97), (0, 238.7334))
        make_face()
    extrude(amount=SKETCHED_BEND3_DEPTH, mode=Mode.SUBTRACT)

    # Sketched Bend3 2 outline → Sketched Bend3 2 (add)
    with BuildSketch(Plane.YZ.offset(SKETCHED_START_5)):
        with BuildLine():
            Line((87.502877303, 242.67), (3.9366, 242.67))
            ThreePointArc((3.9366, 242.67), (3.566662908, 242.652579265), (3.2, 242.600471243))
            Line((3.2, 242.600471243), (3.2, 238.7334))
            ThreePointArc((3.2, 238.7334), (3.415745145, 239.254254855), (3.9366, 239.47))
            Line((3.9366, 239.47), (87.502877303, 239.47))
            Line((87.502877303, 239.47), (87.502877303, 242.67))
        make_face()
    extrude(amount=SKETCHED_BEND3_2_DEPTH)

    # Fillet4
    fillet4_edges = [part.edges().sort_by_distance(p)[0] for p in [
        (-53.74, 87.502877303, 241.07),
        (66.26, 87.502877303, 241.07),
    ]]
    fillet(fillet4_edges, radius=FILLET4_R)

    # Sketched Bend5: read off the stored shape, not the designer's step
    # Sketched Bend5 outline → Sketched Bend5 (cut)
    with BuildSketch(Plane.XY.offset(SKETCHED_START_6)):
        with BuildLine():
            ThreePointArc((69.424838651, 3.2), (71.93453186, 2.296263261), (73.291909894, 0))
            Line((73.291909894, 0), (118.26, 0))
            Line((118.26, 0), (118.26, 3.2))
            Line((118.26, 3.2), (69.424838651, 3.2))
        make_face()
    extrude(amount=SKETCHED_BEND5_DEPTH, mode=Mode.SUBTRACT)

    # Sketched Bend5 2 outline → Sketched Bend5 2 (add)
    with BuildSketch(Plane.XY.offset(SKETCHED_START_7)):
        with BuildLine():
            ThreePointArc((73.361438651, -0.7366), (73.344017916, -0.366662908), (73.291909894, 0))
            Line((73.291909894, 0), (69.424838651, 0))
            ThreePointArc((69.424838651, 0), (69.945693506, -0.215745145), (70.161438651, -0.7366))
            Line((70.161438651, -0.7366), (70.161438651, -25.901438651))
            Line((70.161438651, -25.901438651), (73.361438651, -25.901438651))
            Line((73.361438651, -25.901438651), (73.361438651, -0.7366))
        make_face()
    extrude(amount=SKETCHED_BEND5_2_DEPTH)

    # Sketched Bend5 3 outline → Sketched Bend5 3 (add)
    with BuildSketch(Plane.XY.offset(SKETCHED_START_8)):
        with Locations((71.761438651, -35.901438651)):
            Rectangle(SKETCHED_BEND5_3_OUTLINE_W, SKETCHED_BEND5_3_OUTLINE_H)
    extrude(amount=SKETCHED_BEND5_3_DEPTH)

    # Sketched Bend5 4 outline → Sketched Bend5 4 (add)
    with BuildSketch(Plane.XY.offset(SKETCHED_START_6)):
        with BuildLine():
            ThreePointArc((73.361438651, -0.7366), (73.344017916, -0.366662908), (73.291909894, 0))
            Line((73.291909894, 0), (69.424838651, 0))
            ThreePointArc((69.424838651, 0), (69.945693506, -0.215745145), (70.161438651, -0.7366))
            Line((70.161438651, -0.7366), (70.161438651, -25.901438651))
            Line((70.161438651, -25.901438651), (73.361438651, -25.901438651))
            Line((73.361438651, -25.901438651), (73.361438651, -0.7366))
        make_face()
    extrude(amount=SKETCHED_BEND5_4_DEPTH)

    # Sketched Bend5 5 outline → Sketched Bend5 5 (cut)
    with BuildSketch(Plane.YZ.offset(SKETCHED_START_9)):
        Polygon((-3.901438651, 175.97), (-25.901438651, 207.398571429), (-25.901438651, 175.97), align=None)
    extrude(amount=SKETCHED_BEND5_5_DEPTH, mode=Mode.SUBTRACT)

    # Sketched Bend5 6 outline → Sketched Bend5 6 (add)
    with BuildSketch(Plane.YZ.offset(SKETCHED_START_9)):
        Polygon((-25.901438651, 235.97), (-45.901438651, 235.97), (-25.901438651, 207.398571429), align=None)
    extrude(amount=SKETCHED_BEND5_6_DEPTH)

    # Fillet5
    fillet5_edges = [part.edges().sort_by_distance(p)[0] for p in [
        (41.74, 44.202877303, -115.87),
        (21.74, 44.202877303, -115.87),
    ]]
    fillet(fillet5_edges, radius=FILLET5_R)

    # Fillet6
    fillet6_edges = [part.edges().sort_by_distance(p)[0] for p in [
        (71.761438651, -45.901438651, 235.97),
        (71.761438651, -45.901438651, 242.67),
        (71.761438651, -25.901438651, 242.67),
        (71.761438651, -3.901438651, 175.97),
    ]]
    fillet(fillet6_edges, radius=FILLET6_R)

    # Fillet7
    fillet7_edges = [part.edges().sort_by_distance(p)[0] for p in [
        (71.761438651, -25.901438651, 235.97),
    ]]
    fillet(fillet7_edges, radius=FILLET7_R)


solid = part.part
